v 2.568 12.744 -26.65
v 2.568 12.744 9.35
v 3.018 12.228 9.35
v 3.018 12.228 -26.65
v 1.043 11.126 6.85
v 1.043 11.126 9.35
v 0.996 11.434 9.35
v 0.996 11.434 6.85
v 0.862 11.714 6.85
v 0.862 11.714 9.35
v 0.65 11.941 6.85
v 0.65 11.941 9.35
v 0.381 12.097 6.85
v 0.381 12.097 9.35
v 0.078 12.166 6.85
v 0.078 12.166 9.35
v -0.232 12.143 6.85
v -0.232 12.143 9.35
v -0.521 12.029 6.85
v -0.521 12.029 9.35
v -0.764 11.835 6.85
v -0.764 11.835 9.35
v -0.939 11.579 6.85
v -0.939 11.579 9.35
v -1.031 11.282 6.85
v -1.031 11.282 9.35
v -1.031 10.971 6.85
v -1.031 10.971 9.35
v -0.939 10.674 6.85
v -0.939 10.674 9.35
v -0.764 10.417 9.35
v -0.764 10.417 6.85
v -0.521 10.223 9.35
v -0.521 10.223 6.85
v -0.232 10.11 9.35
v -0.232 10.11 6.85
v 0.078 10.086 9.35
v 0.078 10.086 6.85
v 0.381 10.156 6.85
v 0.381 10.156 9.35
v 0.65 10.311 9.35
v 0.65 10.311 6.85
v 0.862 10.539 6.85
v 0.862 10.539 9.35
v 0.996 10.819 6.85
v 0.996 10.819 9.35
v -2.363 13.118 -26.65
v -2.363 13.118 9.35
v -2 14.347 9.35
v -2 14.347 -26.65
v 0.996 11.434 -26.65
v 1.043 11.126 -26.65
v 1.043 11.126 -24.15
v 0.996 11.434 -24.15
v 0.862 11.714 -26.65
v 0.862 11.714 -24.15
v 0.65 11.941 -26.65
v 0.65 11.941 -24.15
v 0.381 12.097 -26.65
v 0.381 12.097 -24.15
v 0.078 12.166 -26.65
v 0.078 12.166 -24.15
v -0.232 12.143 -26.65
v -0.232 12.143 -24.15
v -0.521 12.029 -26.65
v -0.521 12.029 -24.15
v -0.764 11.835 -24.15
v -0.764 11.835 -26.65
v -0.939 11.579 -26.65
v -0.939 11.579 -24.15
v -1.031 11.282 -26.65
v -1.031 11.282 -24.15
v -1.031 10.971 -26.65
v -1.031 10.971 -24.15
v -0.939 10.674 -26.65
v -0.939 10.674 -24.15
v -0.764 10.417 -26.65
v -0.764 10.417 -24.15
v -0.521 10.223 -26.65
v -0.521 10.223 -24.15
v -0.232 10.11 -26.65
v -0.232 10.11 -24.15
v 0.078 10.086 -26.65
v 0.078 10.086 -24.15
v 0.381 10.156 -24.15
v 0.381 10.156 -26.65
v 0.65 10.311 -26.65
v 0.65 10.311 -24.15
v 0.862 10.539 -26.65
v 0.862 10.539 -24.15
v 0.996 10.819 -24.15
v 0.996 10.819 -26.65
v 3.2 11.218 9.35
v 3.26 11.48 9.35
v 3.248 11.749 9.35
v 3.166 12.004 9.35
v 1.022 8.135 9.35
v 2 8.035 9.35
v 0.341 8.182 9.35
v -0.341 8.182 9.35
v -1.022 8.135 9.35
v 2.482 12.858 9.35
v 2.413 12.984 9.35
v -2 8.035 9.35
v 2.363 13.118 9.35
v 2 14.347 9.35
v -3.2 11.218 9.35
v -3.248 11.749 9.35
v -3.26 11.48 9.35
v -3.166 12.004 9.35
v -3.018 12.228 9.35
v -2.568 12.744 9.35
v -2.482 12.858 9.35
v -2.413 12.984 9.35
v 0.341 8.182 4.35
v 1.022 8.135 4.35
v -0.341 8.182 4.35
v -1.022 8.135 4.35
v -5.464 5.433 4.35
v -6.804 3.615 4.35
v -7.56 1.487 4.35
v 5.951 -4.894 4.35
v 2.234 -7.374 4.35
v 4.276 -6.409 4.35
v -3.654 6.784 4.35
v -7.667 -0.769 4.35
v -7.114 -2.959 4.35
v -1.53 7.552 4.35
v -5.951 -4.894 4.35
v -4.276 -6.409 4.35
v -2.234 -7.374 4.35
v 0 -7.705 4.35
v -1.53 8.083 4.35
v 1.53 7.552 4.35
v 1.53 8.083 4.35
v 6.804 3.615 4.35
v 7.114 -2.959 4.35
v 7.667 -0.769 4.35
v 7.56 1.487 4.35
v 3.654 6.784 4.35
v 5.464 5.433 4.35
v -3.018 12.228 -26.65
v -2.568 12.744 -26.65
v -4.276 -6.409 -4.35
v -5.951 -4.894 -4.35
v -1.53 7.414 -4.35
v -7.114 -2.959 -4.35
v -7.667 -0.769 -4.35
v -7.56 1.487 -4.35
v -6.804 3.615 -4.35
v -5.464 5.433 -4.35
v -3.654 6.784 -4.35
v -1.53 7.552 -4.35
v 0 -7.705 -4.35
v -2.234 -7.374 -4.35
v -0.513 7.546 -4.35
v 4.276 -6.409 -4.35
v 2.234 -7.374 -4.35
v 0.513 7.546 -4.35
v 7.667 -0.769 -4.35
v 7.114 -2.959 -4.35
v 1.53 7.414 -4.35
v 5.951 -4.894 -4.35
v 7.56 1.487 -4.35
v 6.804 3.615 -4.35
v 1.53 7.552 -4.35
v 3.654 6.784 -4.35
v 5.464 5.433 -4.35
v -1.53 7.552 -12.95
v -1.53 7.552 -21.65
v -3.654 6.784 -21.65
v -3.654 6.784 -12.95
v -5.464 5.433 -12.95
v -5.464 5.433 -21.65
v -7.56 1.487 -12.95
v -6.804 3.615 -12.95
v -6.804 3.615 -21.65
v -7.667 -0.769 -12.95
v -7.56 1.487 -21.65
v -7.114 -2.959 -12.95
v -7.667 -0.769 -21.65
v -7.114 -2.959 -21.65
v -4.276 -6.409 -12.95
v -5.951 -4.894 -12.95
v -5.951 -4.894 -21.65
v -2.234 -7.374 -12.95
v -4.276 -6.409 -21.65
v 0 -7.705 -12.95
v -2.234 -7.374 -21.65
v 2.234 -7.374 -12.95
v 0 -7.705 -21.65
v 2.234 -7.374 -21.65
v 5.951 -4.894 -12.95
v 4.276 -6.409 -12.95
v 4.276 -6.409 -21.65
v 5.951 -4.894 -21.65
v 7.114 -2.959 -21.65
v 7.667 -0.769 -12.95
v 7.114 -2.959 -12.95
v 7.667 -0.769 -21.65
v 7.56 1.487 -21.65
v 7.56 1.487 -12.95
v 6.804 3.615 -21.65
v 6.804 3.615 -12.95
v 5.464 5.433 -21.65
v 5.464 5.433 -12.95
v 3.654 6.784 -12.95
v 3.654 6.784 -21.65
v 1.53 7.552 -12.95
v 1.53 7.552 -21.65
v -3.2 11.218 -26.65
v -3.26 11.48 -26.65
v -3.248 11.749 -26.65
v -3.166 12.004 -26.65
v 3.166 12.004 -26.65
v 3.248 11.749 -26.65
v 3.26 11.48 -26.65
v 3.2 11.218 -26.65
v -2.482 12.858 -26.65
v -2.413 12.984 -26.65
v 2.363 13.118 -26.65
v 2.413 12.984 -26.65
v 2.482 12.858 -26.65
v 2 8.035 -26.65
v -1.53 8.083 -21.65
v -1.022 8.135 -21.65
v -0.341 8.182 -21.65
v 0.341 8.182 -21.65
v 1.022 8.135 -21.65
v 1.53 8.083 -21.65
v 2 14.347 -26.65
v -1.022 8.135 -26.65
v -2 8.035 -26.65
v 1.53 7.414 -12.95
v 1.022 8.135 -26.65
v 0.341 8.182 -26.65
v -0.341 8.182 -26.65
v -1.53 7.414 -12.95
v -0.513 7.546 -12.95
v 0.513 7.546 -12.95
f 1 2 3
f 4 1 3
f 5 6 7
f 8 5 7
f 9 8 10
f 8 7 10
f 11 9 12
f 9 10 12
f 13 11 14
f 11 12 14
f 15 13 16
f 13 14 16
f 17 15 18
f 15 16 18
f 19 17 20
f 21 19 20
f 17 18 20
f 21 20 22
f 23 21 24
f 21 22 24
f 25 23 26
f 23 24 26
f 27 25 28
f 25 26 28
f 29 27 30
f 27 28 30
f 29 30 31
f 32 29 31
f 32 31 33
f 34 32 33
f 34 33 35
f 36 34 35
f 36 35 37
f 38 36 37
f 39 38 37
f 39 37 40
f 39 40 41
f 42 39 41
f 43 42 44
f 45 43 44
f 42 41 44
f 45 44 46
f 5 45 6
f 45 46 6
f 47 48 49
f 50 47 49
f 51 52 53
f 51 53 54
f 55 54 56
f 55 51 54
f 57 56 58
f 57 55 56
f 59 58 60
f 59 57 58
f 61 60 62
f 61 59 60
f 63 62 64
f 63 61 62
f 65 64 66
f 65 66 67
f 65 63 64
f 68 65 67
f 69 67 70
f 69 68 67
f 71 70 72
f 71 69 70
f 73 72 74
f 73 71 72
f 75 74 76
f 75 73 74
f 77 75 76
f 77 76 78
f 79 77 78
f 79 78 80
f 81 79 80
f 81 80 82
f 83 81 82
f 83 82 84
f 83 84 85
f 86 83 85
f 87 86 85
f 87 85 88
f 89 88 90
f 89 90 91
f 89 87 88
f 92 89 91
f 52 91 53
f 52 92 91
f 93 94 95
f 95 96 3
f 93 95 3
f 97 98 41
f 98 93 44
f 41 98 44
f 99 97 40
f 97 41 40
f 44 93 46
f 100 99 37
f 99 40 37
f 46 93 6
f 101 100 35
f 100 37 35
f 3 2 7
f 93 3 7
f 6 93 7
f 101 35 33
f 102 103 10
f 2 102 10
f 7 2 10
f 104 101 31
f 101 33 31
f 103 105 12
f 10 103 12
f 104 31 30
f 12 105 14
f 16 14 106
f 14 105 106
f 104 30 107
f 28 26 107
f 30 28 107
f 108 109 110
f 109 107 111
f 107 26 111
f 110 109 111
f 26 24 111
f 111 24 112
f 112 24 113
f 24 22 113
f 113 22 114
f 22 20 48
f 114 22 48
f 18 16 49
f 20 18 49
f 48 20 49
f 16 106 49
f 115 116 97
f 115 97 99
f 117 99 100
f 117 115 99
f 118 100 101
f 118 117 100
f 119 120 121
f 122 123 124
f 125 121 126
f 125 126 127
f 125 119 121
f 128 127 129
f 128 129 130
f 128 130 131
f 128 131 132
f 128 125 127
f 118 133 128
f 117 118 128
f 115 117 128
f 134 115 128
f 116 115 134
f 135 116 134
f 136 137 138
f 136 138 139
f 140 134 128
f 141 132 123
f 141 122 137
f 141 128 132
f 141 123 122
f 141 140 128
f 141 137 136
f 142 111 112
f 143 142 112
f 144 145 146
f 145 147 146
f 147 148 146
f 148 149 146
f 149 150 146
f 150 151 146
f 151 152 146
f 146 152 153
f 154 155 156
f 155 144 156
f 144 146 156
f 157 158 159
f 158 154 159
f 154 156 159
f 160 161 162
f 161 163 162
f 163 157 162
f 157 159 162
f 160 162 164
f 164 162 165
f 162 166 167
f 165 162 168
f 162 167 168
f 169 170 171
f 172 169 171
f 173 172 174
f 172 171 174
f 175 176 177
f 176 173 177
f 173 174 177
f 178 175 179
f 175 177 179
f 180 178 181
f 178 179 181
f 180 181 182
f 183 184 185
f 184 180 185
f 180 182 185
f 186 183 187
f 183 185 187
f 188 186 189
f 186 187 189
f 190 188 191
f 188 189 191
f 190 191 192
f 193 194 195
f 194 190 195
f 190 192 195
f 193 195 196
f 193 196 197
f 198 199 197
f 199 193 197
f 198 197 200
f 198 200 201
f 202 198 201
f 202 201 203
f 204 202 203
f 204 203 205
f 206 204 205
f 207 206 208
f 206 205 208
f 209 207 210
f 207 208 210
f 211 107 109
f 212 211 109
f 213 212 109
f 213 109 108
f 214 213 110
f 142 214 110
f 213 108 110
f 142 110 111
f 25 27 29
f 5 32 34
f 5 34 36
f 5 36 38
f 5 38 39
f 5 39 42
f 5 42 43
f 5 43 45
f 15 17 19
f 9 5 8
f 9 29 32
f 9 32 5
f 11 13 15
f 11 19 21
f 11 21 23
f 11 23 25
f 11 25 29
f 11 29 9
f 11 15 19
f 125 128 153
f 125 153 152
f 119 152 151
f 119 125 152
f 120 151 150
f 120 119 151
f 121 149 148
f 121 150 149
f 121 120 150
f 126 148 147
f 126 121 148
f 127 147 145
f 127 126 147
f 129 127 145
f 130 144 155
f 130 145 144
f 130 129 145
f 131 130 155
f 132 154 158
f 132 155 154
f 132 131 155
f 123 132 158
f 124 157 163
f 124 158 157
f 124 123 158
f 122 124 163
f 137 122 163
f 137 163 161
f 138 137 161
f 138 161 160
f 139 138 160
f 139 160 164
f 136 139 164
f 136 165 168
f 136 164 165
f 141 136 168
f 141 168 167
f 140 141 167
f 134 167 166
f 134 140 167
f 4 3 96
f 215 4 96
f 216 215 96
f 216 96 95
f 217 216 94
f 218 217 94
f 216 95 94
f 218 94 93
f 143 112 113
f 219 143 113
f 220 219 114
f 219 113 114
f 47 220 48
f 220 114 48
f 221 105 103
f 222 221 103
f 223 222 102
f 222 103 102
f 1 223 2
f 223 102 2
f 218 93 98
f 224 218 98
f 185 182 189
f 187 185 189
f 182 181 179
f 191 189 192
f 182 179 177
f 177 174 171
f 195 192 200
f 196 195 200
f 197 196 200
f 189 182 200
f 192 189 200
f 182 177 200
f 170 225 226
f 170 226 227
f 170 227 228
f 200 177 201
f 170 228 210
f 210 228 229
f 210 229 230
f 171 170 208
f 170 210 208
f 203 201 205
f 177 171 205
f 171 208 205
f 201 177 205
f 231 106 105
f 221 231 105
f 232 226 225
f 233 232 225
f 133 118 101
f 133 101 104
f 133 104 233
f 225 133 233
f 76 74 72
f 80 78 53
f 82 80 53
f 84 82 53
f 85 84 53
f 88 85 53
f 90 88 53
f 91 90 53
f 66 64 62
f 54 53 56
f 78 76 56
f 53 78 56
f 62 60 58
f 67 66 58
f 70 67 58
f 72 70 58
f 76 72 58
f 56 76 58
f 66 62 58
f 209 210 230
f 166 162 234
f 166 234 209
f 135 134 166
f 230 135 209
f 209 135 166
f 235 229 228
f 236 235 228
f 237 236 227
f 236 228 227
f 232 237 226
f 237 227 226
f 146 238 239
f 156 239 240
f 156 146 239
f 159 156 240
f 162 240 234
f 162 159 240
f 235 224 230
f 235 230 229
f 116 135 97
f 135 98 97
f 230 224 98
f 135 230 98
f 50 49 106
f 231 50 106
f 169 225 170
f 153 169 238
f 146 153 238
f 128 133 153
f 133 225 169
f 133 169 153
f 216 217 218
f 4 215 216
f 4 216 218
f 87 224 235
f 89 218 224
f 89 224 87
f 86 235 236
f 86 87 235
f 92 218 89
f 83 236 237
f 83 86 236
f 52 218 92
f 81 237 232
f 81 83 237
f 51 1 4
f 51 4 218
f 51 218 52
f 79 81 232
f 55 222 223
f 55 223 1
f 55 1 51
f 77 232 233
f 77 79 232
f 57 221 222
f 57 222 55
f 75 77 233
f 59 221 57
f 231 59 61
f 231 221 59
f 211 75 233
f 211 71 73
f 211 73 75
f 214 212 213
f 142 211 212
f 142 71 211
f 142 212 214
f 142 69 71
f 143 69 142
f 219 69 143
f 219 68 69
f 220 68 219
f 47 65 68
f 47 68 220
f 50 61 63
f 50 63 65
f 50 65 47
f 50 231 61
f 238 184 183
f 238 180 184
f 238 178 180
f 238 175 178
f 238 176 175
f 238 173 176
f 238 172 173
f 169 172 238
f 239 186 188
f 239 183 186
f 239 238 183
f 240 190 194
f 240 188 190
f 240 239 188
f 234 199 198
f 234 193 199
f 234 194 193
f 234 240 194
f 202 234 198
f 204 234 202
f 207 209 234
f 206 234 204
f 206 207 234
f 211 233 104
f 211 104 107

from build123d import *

# Parameters (mm, degrees)
CROQUIS1_R              = 7.705
SALIENTE_EXTRUIR1_DEPTH = 4.35
SALIENTE_EXTRUIR2_START = -13.5
SALIENTE_EXTRUIR2_DEPTH = 18.5
SALIENTE_EXTRUIR3_DEPTH = 13.5
CROQUIS5_R              = 1.042712332
CORTAR_EXTRUIR1_DEPTH   = 2.5


with BuildPart() as part:
    # Croquis1 → Saliente-Extruir1 (new, symmetric)
    with BuildSketch(Plane.XY):
        Circle(CROQUIS1_R)
    saliente_extruir1 = extrude(amount=SALIENTE_EXTRUIR1_DEPTH, both=True)



with BuildPart() as body_2:
    # Croquis3 → Saliente-Extruir2 (new body)
    with BuildSketch(Plane.XY.offset(4.35).offset(SALIENTE_EXTRUIR2_START)):
        with BuildLine():
            Line((2, 8.034909184), (1.02204697, 8.135386739))
            ThreePointArc((1.02204697, 8.135386739), (0, 8.18775285), (-1.02204697, 8.135386739))
            Line((-1.02204697, 8.135386739), (-2, 8.034909184))
            Line((-2, 8.034909184), (-3.200003677, 11.21841322))
            ThreePointArc((-3.200003677, 11.21841322), (-3.248411026, 11.748541167), (-3.017934695, 12.228394865))
            Line((-3.017934695, 12.228394865), (-2.568482545, 12.743765532))
            ThreePointArc((-2.568482545, 12.743765532), (-2.445625709, 12.919659287), (-2.363117092, 13.117711661))
            Line((-2.363117092, 13.117711661), (-2, 14.346858197))
            Line((-2, 14.346858197), (2, 14.346858197))
            Line((2, 14.346858197), (2.363117092, 13.117711661))
            ThreePointArc((2.363117092, 13.117711661), (2.445625709, 12.919659287), (2.568482545, 12.743765532))
            Line((2.568482545, 12.743765532), (3.017934695, 12.228394865))
            ThreePointArc((3.017934695, 12.228394865), (3.248411026, 11.748541167), (3.200003677, 11.21841322))
            Line((3.200003677, 11.21841322), (2, 8.034909184))
        make_face()
    saliente_extruir2 = extrude(amount=SALIENTE_EXTRUIR2_DEPTH)


with BuildPart() as part_1:
    add(part.part)

    add(body_2.part)  # Saliente-Extruir3 merges body 2
    # Croquis4 → Saliente-Extruir3 (add)
    with BuildSketch(Plane.XY.offset(4.35)):
        with BuildLine():
            Line((1.529777798, 7.551609424), (1.529777798, 8.083221093))
            ThreePointArc((1.529777798, 8.083221093), (0, 8.18775285), (-1.529777798, 8.083221093))
            Line((-1.529777798, 8.083221093), (-1.529777798, 7.551609424))
            Line((-1.529777798, 7.551609424), (-1.529777798, 7.414435005))
            ThreePointArc((-1.529777798, 7.414435005), (0, 7.562302456), (1.529777798, 7.414435005))
            Line((1.529777798, 7.414435005), (1.529777798, 7.551609424))
        make_face()
    saliente_extruir3 = extrude(amount=-SALIENTE_EXTRUIR3_DEPTH)

    # Simetría2: Saliente-Extruir2, Saliente-Extruir3 across plane
    add(saliente_extruir2.mirror(Plane.XY.offset(-8.65)))
    add(saliente_extruir3.mirror(Plane.XY.offset(-8.65)))

    # Simetría3: Saliente-Extruir1 across plane
    add(saliente_extruir1.mirror(Plane.XY.offset(-8.65)))

    # Croquis5 → Cortar-Extruir1 (cut)
    with BuildSketch(Plane.XY.offset(9.35)):
        with Locations((0, 11.126169976)):
            Circle(CROQUIS5_R)
    cortar_extruir1 = extrude(amount=-CORTAR_EXTRUIR1_DEPTH, mode=Mode.SUBTRACT)

    # Simetría4: Cortar-Extruir1 across plane
    add(cortar_extruir1.mirror(Plane.XY.offset(-8.65)), mode=Mode.SUBTRACT)


solid = part_1.part
